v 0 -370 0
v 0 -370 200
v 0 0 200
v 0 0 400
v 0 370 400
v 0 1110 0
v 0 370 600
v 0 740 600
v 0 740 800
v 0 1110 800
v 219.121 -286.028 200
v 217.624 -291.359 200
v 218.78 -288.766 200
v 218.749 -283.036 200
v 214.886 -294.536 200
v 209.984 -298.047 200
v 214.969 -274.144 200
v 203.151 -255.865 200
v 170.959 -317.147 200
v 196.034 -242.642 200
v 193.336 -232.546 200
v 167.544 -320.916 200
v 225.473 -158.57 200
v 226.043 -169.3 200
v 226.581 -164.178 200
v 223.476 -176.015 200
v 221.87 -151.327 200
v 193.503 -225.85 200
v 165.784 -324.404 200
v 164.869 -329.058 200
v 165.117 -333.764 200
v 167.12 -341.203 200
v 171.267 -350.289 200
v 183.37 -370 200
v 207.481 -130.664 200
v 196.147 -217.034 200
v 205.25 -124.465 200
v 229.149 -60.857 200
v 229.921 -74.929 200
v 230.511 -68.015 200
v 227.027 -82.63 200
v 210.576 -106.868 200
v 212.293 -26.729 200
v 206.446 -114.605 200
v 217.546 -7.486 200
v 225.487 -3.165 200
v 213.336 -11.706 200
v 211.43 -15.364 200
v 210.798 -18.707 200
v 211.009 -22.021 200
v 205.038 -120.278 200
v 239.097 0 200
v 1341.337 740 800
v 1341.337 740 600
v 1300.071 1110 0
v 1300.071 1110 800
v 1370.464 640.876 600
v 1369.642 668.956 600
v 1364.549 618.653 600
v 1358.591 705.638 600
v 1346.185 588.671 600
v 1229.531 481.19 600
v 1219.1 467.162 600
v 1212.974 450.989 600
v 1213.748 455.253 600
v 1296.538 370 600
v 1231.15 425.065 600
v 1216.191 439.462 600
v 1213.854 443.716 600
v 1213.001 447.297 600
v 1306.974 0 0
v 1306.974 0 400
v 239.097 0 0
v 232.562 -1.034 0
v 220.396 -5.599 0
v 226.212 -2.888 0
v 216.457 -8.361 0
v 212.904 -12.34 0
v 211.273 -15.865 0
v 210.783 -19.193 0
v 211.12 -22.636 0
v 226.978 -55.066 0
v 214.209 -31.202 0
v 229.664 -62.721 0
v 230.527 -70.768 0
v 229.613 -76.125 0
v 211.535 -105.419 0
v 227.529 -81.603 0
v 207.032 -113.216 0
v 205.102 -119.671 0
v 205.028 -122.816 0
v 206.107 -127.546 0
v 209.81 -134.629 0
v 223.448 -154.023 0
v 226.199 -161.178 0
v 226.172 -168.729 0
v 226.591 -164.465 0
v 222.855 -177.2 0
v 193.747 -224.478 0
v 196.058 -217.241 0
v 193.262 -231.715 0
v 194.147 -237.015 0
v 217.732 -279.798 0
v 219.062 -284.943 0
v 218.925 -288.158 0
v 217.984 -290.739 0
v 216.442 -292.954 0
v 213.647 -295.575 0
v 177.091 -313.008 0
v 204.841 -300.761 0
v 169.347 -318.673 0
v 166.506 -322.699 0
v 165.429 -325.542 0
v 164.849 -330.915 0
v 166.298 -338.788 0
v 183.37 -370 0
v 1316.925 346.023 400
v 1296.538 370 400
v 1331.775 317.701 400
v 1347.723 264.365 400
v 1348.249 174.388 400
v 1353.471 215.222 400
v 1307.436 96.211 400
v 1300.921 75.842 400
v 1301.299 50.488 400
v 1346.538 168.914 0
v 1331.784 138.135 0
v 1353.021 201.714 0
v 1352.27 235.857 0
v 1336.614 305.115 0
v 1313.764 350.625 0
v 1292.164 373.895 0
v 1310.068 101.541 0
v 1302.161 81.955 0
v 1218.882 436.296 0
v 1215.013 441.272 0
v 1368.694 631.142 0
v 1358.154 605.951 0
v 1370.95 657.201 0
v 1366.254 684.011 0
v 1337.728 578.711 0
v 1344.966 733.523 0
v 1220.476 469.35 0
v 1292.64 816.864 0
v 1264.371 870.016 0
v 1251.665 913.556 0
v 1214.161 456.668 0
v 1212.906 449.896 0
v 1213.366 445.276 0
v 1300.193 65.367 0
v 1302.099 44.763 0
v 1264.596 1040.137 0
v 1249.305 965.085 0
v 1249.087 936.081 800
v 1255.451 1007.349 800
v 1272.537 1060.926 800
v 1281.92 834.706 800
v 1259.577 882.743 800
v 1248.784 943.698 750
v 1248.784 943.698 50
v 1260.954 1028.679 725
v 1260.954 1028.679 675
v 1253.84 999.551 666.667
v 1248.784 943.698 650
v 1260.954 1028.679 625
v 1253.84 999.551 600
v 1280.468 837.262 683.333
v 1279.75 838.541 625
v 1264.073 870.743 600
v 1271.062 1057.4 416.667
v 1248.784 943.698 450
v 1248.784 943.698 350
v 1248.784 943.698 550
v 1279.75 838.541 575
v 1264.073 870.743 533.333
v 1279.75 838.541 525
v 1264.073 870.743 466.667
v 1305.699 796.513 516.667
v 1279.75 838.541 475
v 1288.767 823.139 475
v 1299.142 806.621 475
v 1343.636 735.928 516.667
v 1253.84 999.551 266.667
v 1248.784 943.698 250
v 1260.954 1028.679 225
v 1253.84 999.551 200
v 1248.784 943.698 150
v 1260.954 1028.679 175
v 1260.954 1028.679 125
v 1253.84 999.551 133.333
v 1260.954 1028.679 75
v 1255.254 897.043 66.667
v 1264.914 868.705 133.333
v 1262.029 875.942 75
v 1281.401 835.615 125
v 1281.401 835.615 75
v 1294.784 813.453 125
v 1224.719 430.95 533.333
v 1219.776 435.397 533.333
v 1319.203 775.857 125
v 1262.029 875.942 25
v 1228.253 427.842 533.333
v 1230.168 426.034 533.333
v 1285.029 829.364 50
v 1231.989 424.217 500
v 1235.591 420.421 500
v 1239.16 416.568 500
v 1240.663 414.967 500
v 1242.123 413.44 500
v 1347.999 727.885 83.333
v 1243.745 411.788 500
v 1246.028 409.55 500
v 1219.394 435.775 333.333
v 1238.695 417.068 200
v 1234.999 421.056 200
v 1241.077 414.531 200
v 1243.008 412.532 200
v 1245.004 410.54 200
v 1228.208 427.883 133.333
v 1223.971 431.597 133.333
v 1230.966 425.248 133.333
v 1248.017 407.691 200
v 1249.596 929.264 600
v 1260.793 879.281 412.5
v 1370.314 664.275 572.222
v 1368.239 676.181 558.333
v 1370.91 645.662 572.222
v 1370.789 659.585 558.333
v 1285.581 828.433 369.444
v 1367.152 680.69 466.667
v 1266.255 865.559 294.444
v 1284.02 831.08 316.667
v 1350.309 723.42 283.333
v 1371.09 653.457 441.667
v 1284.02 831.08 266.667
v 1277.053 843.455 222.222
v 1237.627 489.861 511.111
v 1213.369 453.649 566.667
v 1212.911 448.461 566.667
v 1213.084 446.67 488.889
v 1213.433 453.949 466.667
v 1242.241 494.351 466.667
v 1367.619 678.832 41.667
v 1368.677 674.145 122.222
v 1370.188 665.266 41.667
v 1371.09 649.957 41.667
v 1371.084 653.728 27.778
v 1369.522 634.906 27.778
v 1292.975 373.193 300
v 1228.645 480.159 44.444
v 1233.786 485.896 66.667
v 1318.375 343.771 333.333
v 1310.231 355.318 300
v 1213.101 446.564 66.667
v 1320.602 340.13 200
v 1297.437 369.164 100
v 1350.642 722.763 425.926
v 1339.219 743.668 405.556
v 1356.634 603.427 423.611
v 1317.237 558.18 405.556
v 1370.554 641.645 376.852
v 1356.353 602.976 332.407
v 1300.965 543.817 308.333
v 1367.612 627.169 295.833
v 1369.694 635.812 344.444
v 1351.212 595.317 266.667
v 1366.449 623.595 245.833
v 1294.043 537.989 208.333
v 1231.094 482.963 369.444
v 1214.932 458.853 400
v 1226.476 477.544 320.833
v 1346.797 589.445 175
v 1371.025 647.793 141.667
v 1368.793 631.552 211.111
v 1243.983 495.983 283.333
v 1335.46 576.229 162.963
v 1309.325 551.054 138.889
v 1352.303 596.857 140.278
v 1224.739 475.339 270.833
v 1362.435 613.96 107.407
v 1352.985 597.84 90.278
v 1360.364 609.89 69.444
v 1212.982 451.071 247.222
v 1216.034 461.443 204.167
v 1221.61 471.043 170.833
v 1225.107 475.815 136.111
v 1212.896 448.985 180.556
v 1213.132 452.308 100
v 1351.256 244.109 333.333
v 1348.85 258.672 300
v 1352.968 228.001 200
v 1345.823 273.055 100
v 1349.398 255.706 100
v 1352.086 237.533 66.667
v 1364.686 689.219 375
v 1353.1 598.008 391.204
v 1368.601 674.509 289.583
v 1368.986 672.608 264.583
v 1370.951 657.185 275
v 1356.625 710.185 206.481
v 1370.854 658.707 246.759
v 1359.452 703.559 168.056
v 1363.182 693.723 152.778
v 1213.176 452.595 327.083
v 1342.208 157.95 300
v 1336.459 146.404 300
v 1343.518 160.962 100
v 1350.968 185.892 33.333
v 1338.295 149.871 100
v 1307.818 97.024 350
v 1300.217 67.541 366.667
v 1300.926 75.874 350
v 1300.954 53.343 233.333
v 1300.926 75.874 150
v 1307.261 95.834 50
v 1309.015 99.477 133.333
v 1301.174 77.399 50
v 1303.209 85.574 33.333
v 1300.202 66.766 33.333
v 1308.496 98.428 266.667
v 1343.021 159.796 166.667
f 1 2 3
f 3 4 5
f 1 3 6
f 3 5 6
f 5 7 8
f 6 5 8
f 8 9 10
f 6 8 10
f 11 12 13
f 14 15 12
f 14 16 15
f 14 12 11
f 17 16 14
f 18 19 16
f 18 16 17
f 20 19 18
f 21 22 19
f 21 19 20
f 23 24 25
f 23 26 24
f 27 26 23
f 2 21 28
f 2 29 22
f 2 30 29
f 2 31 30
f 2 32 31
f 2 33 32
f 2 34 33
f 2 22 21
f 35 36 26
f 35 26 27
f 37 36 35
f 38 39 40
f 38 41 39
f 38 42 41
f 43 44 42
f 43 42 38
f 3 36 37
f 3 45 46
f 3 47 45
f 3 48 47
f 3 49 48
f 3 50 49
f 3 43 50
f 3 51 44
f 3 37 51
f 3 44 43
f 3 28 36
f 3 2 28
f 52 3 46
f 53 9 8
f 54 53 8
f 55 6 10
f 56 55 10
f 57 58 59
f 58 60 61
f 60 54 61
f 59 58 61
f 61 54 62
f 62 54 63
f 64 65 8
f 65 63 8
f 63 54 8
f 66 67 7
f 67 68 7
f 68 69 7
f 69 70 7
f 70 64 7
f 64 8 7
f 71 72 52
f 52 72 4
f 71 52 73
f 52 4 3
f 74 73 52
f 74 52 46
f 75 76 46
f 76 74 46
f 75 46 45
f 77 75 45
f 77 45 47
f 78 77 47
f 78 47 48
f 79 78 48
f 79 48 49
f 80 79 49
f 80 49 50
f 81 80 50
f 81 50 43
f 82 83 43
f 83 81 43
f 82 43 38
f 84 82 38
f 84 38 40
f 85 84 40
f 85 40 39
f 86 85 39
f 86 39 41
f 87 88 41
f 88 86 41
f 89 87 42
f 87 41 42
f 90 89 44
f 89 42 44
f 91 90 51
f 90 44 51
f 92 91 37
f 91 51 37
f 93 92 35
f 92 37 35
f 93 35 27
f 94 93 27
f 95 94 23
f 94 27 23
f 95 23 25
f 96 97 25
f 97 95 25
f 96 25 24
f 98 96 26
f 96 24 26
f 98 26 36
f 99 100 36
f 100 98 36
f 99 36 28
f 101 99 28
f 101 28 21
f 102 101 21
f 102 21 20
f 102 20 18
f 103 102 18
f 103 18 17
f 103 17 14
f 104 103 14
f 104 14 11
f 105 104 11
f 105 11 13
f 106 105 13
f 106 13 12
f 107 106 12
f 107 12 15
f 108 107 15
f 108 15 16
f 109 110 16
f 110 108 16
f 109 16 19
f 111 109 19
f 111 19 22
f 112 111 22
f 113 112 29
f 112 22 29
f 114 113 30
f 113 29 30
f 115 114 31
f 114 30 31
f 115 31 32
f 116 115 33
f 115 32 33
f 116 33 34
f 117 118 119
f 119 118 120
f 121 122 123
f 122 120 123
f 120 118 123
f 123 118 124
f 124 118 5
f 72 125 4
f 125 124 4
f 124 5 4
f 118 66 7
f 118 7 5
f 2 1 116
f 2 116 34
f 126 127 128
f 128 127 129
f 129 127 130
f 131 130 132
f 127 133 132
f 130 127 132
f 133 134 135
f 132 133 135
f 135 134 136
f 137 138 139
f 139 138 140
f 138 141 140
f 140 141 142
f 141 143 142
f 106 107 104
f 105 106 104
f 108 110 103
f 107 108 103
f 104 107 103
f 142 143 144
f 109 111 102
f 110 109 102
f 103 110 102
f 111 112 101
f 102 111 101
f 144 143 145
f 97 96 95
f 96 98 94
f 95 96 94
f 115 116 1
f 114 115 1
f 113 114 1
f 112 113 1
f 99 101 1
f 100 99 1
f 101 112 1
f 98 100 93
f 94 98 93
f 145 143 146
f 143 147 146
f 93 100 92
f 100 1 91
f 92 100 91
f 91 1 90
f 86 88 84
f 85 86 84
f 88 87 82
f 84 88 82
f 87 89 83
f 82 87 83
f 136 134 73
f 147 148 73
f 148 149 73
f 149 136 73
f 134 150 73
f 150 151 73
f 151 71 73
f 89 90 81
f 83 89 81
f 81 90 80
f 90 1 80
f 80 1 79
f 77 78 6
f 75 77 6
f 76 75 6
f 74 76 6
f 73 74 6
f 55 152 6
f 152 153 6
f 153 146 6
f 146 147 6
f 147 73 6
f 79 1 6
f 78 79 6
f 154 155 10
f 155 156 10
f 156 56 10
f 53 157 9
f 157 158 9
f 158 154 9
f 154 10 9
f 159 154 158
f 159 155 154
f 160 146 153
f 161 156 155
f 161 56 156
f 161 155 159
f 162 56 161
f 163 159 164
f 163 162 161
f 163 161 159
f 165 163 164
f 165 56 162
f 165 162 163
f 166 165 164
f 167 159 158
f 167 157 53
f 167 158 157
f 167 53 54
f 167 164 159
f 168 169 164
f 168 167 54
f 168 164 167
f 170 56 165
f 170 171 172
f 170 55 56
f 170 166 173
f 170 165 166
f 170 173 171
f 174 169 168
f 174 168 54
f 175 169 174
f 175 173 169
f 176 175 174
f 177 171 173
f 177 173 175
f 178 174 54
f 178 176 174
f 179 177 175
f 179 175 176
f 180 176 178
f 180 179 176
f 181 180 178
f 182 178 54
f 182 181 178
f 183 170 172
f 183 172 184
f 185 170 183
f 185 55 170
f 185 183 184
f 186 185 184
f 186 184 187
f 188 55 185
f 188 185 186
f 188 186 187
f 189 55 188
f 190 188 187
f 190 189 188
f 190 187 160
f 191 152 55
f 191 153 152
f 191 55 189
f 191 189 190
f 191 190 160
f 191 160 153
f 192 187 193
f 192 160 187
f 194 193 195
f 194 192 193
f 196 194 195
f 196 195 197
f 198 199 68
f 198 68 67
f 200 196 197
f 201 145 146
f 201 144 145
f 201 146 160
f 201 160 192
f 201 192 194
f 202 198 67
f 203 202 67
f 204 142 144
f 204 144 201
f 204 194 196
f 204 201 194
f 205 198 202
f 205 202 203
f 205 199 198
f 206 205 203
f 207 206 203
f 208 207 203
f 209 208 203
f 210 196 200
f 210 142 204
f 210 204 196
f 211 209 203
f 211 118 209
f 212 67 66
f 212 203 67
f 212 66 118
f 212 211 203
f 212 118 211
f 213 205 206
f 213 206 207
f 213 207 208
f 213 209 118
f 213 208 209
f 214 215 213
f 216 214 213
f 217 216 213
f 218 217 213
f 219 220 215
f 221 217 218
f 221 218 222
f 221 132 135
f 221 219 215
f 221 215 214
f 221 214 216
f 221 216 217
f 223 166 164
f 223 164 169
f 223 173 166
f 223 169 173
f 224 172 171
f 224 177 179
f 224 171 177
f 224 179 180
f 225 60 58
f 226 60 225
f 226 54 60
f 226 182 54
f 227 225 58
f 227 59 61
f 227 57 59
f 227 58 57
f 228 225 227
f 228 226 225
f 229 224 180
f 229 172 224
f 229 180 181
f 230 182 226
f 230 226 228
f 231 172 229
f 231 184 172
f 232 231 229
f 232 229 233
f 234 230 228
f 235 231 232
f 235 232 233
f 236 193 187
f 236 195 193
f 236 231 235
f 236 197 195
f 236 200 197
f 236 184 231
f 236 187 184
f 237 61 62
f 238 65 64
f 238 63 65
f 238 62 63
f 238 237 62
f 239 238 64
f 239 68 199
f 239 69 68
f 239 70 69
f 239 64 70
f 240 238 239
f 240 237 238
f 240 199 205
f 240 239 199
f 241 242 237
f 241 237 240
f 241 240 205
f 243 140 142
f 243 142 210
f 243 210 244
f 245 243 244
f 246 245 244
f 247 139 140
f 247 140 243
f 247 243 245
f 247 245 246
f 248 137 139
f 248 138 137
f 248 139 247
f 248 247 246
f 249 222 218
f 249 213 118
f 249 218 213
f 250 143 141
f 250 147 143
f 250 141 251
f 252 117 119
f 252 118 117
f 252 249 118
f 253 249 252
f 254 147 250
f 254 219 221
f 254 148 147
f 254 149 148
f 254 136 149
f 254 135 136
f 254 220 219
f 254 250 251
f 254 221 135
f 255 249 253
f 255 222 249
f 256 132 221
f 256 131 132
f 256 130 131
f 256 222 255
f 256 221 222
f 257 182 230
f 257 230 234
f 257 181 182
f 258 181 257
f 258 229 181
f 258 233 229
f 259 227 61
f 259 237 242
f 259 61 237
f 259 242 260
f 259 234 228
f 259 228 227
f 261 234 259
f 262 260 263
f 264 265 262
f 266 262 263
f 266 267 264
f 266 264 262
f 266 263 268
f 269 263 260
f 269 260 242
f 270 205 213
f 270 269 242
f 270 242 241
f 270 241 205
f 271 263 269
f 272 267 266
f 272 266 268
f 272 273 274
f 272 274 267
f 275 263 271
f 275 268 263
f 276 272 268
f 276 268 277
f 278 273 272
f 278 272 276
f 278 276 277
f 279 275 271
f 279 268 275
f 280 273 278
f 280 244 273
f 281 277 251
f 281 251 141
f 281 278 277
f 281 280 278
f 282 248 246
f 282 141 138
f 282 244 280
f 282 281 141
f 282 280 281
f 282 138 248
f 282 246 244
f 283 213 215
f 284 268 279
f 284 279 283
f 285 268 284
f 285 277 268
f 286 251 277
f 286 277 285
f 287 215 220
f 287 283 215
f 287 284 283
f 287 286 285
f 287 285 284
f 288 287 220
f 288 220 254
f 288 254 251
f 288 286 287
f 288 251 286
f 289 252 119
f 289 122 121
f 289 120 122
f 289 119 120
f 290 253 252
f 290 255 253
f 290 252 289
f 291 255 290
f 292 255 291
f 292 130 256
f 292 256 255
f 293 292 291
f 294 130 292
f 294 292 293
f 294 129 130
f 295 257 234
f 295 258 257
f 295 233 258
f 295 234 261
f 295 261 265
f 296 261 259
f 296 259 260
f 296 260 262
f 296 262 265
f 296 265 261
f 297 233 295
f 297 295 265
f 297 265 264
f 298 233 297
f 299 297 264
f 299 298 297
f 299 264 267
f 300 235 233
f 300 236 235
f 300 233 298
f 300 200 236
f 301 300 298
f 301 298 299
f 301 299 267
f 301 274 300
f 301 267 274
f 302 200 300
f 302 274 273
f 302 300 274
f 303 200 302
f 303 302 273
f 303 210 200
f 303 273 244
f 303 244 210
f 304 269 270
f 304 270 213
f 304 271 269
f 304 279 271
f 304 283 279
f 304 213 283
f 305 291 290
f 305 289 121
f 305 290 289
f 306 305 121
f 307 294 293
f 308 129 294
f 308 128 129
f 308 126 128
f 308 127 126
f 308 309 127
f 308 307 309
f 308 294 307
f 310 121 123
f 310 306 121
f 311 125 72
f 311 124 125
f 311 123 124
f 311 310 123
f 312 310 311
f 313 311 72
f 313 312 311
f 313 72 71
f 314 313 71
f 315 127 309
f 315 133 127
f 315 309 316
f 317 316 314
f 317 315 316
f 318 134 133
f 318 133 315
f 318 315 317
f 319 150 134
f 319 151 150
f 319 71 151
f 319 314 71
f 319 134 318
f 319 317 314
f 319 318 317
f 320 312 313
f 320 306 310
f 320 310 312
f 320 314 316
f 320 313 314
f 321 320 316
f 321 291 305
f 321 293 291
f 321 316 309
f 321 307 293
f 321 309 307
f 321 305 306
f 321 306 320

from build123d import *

# Parameters (mm, degrees)
F0_W     = 370
F0_H     = 200
F1_DEPTH = 250
F3_DEPTH = 1400
F5_DEPTH = 200.001
F7_DEPTH = 800.001


with BuildPart() as f1:
    # F0 (on Right) → F1 (new body)
    with BuildSketch(Plane.YZ):
        with Locations((-185, 100)):
            Rectangle(F0_W, F0_H)
    extrude(amount=F1_DEPTH)

    # F2 (on Right) → F3 (join)
    with BuildSketch(Plane.YZ):
        Polygon((0, 400), (0, 0), (1110, 0), (1110, 800), (740, 800), (740, 600), (370, 600), (370, 400), align=None)
    extrude(amount=F3_DEPTH)

    # F4 (on face) → F5 (cut, through all)
    with BuildSketch(Plane.XY.offset(200)):
        with BuildLine():
            Line((250, -370), (250, 0))
            Line((250, 0), (239.0966257007, 0))
            add(Edge.make_bspline(
                [(239.0966257007, 0), (224.9281745367, -1.3877650412), (193.5675752206, -17.6220787936), (254.1312191274, -72.7899930375), (181.8440227877, -121.7633073225), (253.330394472, -166.0449779372), (161.8849726525, -227.4234181148), (250.6643454579, -296.9094215229), (148.4768404974, -311.3575065291), (168.233976576, -347.2984312104), (183.3697259426, -370)],
                knots=[0.0108773659, 0.0108773659, 0.0108773659, 0.0108773659, 0.0536118354, 0.115118344, 0.1769195174, 0.2337683064, 0.3036067901, 0.3691498749, 0.431042265, 0.4908050033, 0.4908050033, 0.4908050033, 0.4908050033], degree=3))
            Line((183.3697259426, -370), (250, -370))
        make_face()
    extrude(amount=-F5_DEPTH, mode=Mode.SUBTRACT)

    # F6 (on Top) → F7 (cut, through all)
    with BuildSketch(Plane.XY):
        with BuildLine():
            add(Edge.make_bspline(
                [(1355.0444841385, 1158.7491035461), (1284.2233729879, 1122.7564913323), (1215.9844306573, 931.7905753878), (1307.560248118, 794.4153741816), (1421.9799618969, 617.4973979427), (1238.7040991782, 504.6944569107), (1204.0761922351, 445.4083884275), (1230.8571910461, 427.6292215241), (1250.1662751719, 401.2135430471), (1317.493744612, 364.130041832), (1352.4070358264, 266.0252666363), (1359.3019982753, 162.3382206665), (1284.7846468273, 81.5299903552), (1319.6271754815, 6.0368781426), (1271.4958776342, -180.3022766639), (1629.7218201893, -24.4762249566), (1778.1125247876, 1073.7816100627), (1433.6257724113, 1198.6855827982), (1355.0444841385, 1158.7491035461)],
                knots=[0, 0, 0, 0, 0.0790901007, 0.1455021695, 0.2118547084, 0.2811889193, 0.3192478056, 0.3439109846, 0.3728893055, 0.4161952003, 0.4677664575, 0.5191462279, 0.5686349976, 0.6146286579, 0.6709275311, 0.7482993654, 0.912243653, 1, 1, 1, 1], degree=3))
        make_face()
    extrude(amount=F7_DEPTH, mode=Mode.SUBTRACT)


solid = f1.part
